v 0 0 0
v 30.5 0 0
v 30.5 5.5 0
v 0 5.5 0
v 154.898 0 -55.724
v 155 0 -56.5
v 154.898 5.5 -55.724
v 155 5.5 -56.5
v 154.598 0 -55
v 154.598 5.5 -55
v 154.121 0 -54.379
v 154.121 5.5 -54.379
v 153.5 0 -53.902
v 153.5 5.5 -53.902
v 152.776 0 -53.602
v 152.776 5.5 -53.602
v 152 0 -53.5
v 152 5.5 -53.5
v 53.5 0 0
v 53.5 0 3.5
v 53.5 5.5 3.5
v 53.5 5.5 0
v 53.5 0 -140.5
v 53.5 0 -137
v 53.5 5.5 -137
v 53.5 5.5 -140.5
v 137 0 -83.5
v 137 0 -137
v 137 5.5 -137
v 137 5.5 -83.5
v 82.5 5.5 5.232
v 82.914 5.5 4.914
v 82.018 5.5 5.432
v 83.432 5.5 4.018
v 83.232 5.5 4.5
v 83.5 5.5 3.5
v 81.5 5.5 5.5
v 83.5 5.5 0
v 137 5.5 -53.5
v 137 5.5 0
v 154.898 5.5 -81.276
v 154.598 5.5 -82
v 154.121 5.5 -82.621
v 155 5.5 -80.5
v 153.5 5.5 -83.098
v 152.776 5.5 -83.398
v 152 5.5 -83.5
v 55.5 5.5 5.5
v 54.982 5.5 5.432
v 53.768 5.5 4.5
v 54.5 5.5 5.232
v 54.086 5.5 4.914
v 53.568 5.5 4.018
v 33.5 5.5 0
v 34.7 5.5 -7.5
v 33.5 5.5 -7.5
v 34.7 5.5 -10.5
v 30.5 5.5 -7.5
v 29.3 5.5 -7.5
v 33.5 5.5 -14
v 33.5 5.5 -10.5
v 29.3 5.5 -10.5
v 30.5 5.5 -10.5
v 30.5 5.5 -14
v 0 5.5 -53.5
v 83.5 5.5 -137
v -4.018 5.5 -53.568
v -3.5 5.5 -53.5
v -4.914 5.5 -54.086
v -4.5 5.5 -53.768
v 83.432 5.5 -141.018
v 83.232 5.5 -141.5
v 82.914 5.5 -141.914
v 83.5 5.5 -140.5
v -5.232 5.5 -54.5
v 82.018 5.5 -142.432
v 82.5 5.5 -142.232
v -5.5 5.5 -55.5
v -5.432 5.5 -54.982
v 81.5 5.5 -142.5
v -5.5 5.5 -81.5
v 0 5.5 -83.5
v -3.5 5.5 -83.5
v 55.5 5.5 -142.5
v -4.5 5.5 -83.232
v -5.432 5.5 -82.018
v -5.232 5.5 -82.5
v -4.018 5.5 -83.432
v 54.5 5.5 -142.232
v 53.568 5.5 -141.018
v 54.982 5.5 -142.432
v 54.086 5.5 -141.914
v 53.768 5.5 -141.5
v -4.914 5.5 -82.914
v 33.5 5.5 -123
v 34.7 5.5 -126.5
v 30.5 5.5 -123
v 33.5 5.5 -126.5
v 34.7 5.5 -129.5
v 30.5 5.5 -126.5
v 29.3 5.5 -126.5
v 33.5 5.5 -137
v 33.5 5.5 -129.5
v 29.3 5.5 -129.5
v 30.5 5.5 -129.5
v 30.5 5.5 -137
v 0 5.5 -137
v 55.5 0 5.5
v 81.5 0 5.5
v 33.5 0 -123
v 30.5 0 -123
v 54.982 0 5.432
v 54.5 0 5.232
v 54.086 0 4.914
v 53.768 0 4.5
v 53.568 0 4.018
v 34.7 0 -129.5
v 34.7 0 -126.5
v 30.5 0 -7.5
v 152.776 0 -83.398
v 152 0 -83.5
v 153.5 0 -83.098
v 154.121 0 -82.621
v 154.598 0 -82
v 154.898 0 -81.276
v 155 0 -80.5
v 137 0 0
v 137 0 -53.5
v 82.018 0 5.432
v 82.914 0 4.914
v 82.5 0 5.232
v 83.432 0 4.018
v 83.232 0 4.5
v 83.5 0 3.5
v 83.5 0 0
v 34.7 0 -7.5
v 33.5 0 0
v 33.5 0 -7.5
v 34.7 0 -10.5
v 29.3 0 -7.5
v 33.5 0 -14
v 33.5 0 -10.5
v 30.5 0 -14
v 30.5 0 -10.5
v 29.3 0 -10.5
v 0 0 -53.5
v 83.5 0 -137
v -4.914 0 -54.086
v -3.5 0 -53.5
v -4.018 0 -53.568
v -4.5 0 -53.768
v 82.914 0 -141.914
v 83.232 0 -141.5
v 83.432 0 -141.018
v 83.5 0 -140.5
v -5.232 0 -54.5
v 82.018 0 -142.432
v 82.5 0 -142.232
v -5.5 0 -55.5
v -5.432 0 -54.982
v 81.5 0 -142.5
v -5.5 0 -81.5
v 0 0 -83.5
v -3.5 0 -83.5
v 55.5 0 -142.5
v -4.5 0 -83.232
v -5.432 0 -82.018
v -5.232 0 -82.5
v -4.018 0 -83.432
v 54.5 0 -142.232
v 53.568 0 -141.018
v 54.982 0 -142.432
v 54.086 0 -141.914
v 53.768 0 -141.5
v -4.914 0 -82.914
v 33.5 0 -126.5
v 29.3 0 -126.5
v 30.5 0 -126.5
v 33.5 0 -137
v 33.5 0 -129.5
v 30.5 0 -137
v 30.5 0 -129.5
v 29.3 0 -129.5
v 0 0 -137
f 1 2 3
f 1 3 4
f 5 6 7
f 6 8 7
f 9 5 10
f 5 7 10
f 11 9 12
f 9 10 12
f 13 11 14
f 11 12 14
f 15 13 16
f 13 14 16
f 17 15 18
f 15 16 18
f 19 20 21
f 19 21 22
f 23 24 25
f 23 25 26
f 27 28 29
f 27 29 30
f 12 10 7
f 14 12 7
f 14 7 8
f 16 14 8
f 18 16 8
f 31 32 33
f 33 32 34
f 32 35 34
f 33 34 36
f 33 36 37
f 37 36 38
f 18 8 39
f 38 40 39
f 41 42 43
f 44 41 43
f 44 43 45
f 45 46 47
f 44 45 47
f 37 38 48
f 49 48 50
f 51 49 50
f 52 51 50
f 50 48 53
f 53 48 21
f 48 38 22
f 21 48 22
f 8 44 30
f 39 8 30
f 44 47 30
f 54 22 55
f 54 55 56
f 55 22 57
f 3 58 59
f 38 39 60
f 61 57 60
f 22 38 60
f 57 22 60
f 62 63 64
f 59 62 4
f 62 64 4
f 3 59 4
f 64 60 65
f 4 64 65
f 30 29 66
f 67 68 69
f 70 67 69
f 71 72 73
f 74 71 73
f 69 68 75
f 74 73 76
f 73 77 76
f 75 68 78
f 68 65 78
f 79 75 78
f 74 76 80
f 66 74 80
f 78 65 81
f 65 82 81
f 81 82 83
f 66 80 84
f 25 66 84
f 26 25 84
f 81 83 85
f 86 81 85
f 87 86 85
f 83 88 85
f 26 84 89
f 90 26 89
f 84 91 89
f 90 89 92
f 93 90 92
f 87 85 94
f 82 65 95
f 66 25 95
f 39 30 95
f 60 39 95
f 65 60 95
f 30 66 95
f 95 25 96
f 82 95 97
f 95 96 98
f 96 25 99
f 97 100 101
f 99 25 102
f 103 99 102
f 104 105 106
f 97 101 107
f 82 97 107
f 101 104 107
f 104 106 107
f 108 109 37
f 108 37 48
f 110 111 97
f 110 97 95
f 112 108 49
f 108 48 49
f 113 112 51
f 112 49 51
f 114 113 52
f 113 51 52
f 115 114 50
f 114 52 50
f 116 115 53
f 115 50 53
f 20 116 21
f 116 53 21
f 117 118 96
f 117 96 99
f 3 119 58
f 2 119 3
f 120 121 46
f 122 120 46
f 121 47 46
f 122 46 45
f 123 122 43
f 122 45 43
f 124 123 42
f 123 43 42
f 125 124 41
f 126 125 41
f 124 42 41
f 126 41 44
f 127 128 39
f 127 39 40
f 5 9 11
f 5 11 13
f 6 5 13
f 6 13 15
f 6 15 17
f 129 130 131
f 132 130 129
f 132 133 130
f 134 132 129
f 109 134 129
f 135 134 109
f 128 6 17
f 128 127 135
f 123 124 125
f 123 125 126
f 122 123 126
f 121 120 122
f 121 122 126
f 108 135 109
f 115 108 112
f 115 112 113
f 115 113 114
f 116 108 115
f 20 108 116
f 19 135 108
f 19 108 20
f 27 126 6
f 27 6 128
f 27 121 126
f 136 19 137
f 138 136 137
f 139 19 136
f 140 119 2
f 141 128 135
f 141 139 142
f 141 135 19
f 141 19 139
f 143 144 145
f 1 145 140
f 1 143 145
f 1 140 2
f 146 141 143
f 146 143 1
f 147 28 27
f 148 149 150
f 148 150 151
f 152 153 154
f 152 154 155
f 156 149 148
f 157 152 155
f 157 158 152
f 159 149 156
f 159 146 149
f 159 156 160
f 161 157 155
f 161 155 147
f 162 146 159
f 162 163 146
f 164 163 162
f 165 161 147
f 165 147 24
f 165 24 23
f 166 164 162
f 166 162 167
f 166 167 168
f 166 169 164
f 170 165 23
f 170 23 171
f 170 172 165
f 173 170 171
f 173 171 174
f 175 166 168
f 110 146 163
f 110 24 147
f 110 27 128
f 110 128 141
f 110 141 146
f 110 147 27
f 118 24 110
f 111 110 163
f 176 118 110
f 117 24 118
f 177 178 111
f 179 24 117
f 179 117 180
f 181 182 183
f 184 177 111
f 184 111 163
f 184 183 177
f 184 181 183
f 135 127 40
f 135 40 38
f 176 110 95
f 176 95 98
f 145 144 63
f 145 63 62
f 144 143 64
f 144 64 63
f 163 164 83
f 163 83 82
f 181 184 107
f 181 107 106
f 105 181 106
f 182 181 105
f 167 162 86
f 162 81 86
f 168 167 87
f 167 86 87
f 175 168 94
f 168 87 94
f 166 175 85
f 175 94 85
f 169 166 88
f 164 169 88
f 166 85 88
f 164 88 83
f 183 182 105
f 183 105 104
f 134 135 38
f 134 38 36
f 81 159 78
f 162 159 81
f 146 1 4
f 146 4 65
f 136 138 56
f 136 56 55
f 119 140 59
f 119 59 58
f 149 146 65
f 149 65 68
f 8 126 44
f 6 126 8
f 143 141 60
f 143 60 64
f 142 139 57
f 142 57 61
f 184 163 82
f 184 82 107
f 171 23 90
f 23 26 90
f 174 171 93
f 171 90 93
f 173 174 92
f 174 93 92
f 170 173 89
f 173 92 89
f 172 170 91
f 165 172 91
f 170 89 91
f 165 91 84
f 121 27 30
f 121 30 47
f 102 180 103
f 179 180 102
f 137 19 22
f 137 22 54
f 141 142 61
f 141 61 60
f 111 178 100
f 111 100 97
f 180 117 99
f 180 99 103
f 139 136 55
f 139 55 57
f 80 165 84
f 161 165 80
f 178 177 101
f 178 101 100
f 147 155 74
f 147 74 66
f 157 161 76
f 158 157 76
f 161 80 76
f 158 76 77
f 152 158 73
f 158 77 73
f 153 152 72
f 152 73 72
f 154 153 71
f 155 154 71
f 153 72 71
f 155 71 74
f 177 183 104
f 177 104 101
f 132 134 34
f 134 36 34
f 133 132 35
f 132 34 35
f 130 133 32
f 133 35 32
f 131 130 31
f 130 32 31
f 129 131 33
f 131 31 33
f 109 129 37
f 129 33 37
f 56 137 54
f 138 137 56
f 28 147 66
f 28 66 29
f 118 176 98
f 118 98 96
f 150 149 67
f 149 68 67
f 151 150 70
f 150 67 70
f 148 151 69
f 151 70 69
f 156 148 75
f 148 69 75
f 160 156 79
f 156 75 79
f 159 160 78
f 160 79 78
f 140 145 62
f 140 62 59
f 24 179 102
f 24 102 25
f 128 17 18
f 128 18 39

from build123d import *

# Parameters (mm, degrees)
BOSS_EXTRUDE1_DEPTH = 5.5
FILLET1_R           = 2
FILLET2_R           = 3


with BuildPart() as part:
    # Sketch1 → Boss-Extrude1 (new body)
    with BuildSketch(Plane(origin=(0, 0, 0), x_dir=(1, 0, 0), z_dir=(0, 1, 0))):
        Polygon((0, 83.5), (0, 137), (30.5, 137), (30.5, 129.5), (29.3, 129.5), (29.3, 126.5), (30.5, 126.5), (30.5, 123), (33.5, 123), (33.5, 126.5), (34.7, 126.5), (34.7, 129.5), (33.5, 129.5), (33.5, 137), (53.5, 137), (53.5, 142.5), (83.5, 142.5), (83.5, 137), (137, 137), (137, 83.5), (155, 83.5), (155, 53.5), (137, 53.5), (137, 0), (83.5, 0), (83.5, -5.5), (53.5, -5.5), (53.5, 0), (33.5, 0), (33.5, 7.5), (34.7, 7.5), (34.7, 10.5), (33.5, 10.5), (33.5, 14), (30.5, 14), (30.5, 10.5), (29.3, 10.5), (29.3, 7.5), (30.5, 7.5), (30.5, 0), (0, 0), (0, 53.5), (-5.5, 53.5), (-5.5, 83.5), align=None)
    extrude(amount=BOSS_EXTRUDE1_DEPTH)

    # Fillet1
    fillet1_edges = [part.edges().sort_by_distance(p)[0] for p in [
        (-5.5, 2.75, -53.5),
        (-5.5, 2.75, -83.5),
        (53.5, 2.75, -142.5),
        (83.5, 2.75, -142.5),
        (83.5, 2.75, 5.5),
        (53.5, 2.75, 5.5),
    ]]
    fillet(fillet1_edges, radius=FILLET1_R)

    # Fillet2
    fillet2_edges = [part.edges().sort_by_distance(p)[0] for p in [
        (155, 2.75, -83.5),
        (155, 2.75, -53.5),
    ]]
    fillet(fillet2_edges, radius=FILLET2_R)


solid = part.part
